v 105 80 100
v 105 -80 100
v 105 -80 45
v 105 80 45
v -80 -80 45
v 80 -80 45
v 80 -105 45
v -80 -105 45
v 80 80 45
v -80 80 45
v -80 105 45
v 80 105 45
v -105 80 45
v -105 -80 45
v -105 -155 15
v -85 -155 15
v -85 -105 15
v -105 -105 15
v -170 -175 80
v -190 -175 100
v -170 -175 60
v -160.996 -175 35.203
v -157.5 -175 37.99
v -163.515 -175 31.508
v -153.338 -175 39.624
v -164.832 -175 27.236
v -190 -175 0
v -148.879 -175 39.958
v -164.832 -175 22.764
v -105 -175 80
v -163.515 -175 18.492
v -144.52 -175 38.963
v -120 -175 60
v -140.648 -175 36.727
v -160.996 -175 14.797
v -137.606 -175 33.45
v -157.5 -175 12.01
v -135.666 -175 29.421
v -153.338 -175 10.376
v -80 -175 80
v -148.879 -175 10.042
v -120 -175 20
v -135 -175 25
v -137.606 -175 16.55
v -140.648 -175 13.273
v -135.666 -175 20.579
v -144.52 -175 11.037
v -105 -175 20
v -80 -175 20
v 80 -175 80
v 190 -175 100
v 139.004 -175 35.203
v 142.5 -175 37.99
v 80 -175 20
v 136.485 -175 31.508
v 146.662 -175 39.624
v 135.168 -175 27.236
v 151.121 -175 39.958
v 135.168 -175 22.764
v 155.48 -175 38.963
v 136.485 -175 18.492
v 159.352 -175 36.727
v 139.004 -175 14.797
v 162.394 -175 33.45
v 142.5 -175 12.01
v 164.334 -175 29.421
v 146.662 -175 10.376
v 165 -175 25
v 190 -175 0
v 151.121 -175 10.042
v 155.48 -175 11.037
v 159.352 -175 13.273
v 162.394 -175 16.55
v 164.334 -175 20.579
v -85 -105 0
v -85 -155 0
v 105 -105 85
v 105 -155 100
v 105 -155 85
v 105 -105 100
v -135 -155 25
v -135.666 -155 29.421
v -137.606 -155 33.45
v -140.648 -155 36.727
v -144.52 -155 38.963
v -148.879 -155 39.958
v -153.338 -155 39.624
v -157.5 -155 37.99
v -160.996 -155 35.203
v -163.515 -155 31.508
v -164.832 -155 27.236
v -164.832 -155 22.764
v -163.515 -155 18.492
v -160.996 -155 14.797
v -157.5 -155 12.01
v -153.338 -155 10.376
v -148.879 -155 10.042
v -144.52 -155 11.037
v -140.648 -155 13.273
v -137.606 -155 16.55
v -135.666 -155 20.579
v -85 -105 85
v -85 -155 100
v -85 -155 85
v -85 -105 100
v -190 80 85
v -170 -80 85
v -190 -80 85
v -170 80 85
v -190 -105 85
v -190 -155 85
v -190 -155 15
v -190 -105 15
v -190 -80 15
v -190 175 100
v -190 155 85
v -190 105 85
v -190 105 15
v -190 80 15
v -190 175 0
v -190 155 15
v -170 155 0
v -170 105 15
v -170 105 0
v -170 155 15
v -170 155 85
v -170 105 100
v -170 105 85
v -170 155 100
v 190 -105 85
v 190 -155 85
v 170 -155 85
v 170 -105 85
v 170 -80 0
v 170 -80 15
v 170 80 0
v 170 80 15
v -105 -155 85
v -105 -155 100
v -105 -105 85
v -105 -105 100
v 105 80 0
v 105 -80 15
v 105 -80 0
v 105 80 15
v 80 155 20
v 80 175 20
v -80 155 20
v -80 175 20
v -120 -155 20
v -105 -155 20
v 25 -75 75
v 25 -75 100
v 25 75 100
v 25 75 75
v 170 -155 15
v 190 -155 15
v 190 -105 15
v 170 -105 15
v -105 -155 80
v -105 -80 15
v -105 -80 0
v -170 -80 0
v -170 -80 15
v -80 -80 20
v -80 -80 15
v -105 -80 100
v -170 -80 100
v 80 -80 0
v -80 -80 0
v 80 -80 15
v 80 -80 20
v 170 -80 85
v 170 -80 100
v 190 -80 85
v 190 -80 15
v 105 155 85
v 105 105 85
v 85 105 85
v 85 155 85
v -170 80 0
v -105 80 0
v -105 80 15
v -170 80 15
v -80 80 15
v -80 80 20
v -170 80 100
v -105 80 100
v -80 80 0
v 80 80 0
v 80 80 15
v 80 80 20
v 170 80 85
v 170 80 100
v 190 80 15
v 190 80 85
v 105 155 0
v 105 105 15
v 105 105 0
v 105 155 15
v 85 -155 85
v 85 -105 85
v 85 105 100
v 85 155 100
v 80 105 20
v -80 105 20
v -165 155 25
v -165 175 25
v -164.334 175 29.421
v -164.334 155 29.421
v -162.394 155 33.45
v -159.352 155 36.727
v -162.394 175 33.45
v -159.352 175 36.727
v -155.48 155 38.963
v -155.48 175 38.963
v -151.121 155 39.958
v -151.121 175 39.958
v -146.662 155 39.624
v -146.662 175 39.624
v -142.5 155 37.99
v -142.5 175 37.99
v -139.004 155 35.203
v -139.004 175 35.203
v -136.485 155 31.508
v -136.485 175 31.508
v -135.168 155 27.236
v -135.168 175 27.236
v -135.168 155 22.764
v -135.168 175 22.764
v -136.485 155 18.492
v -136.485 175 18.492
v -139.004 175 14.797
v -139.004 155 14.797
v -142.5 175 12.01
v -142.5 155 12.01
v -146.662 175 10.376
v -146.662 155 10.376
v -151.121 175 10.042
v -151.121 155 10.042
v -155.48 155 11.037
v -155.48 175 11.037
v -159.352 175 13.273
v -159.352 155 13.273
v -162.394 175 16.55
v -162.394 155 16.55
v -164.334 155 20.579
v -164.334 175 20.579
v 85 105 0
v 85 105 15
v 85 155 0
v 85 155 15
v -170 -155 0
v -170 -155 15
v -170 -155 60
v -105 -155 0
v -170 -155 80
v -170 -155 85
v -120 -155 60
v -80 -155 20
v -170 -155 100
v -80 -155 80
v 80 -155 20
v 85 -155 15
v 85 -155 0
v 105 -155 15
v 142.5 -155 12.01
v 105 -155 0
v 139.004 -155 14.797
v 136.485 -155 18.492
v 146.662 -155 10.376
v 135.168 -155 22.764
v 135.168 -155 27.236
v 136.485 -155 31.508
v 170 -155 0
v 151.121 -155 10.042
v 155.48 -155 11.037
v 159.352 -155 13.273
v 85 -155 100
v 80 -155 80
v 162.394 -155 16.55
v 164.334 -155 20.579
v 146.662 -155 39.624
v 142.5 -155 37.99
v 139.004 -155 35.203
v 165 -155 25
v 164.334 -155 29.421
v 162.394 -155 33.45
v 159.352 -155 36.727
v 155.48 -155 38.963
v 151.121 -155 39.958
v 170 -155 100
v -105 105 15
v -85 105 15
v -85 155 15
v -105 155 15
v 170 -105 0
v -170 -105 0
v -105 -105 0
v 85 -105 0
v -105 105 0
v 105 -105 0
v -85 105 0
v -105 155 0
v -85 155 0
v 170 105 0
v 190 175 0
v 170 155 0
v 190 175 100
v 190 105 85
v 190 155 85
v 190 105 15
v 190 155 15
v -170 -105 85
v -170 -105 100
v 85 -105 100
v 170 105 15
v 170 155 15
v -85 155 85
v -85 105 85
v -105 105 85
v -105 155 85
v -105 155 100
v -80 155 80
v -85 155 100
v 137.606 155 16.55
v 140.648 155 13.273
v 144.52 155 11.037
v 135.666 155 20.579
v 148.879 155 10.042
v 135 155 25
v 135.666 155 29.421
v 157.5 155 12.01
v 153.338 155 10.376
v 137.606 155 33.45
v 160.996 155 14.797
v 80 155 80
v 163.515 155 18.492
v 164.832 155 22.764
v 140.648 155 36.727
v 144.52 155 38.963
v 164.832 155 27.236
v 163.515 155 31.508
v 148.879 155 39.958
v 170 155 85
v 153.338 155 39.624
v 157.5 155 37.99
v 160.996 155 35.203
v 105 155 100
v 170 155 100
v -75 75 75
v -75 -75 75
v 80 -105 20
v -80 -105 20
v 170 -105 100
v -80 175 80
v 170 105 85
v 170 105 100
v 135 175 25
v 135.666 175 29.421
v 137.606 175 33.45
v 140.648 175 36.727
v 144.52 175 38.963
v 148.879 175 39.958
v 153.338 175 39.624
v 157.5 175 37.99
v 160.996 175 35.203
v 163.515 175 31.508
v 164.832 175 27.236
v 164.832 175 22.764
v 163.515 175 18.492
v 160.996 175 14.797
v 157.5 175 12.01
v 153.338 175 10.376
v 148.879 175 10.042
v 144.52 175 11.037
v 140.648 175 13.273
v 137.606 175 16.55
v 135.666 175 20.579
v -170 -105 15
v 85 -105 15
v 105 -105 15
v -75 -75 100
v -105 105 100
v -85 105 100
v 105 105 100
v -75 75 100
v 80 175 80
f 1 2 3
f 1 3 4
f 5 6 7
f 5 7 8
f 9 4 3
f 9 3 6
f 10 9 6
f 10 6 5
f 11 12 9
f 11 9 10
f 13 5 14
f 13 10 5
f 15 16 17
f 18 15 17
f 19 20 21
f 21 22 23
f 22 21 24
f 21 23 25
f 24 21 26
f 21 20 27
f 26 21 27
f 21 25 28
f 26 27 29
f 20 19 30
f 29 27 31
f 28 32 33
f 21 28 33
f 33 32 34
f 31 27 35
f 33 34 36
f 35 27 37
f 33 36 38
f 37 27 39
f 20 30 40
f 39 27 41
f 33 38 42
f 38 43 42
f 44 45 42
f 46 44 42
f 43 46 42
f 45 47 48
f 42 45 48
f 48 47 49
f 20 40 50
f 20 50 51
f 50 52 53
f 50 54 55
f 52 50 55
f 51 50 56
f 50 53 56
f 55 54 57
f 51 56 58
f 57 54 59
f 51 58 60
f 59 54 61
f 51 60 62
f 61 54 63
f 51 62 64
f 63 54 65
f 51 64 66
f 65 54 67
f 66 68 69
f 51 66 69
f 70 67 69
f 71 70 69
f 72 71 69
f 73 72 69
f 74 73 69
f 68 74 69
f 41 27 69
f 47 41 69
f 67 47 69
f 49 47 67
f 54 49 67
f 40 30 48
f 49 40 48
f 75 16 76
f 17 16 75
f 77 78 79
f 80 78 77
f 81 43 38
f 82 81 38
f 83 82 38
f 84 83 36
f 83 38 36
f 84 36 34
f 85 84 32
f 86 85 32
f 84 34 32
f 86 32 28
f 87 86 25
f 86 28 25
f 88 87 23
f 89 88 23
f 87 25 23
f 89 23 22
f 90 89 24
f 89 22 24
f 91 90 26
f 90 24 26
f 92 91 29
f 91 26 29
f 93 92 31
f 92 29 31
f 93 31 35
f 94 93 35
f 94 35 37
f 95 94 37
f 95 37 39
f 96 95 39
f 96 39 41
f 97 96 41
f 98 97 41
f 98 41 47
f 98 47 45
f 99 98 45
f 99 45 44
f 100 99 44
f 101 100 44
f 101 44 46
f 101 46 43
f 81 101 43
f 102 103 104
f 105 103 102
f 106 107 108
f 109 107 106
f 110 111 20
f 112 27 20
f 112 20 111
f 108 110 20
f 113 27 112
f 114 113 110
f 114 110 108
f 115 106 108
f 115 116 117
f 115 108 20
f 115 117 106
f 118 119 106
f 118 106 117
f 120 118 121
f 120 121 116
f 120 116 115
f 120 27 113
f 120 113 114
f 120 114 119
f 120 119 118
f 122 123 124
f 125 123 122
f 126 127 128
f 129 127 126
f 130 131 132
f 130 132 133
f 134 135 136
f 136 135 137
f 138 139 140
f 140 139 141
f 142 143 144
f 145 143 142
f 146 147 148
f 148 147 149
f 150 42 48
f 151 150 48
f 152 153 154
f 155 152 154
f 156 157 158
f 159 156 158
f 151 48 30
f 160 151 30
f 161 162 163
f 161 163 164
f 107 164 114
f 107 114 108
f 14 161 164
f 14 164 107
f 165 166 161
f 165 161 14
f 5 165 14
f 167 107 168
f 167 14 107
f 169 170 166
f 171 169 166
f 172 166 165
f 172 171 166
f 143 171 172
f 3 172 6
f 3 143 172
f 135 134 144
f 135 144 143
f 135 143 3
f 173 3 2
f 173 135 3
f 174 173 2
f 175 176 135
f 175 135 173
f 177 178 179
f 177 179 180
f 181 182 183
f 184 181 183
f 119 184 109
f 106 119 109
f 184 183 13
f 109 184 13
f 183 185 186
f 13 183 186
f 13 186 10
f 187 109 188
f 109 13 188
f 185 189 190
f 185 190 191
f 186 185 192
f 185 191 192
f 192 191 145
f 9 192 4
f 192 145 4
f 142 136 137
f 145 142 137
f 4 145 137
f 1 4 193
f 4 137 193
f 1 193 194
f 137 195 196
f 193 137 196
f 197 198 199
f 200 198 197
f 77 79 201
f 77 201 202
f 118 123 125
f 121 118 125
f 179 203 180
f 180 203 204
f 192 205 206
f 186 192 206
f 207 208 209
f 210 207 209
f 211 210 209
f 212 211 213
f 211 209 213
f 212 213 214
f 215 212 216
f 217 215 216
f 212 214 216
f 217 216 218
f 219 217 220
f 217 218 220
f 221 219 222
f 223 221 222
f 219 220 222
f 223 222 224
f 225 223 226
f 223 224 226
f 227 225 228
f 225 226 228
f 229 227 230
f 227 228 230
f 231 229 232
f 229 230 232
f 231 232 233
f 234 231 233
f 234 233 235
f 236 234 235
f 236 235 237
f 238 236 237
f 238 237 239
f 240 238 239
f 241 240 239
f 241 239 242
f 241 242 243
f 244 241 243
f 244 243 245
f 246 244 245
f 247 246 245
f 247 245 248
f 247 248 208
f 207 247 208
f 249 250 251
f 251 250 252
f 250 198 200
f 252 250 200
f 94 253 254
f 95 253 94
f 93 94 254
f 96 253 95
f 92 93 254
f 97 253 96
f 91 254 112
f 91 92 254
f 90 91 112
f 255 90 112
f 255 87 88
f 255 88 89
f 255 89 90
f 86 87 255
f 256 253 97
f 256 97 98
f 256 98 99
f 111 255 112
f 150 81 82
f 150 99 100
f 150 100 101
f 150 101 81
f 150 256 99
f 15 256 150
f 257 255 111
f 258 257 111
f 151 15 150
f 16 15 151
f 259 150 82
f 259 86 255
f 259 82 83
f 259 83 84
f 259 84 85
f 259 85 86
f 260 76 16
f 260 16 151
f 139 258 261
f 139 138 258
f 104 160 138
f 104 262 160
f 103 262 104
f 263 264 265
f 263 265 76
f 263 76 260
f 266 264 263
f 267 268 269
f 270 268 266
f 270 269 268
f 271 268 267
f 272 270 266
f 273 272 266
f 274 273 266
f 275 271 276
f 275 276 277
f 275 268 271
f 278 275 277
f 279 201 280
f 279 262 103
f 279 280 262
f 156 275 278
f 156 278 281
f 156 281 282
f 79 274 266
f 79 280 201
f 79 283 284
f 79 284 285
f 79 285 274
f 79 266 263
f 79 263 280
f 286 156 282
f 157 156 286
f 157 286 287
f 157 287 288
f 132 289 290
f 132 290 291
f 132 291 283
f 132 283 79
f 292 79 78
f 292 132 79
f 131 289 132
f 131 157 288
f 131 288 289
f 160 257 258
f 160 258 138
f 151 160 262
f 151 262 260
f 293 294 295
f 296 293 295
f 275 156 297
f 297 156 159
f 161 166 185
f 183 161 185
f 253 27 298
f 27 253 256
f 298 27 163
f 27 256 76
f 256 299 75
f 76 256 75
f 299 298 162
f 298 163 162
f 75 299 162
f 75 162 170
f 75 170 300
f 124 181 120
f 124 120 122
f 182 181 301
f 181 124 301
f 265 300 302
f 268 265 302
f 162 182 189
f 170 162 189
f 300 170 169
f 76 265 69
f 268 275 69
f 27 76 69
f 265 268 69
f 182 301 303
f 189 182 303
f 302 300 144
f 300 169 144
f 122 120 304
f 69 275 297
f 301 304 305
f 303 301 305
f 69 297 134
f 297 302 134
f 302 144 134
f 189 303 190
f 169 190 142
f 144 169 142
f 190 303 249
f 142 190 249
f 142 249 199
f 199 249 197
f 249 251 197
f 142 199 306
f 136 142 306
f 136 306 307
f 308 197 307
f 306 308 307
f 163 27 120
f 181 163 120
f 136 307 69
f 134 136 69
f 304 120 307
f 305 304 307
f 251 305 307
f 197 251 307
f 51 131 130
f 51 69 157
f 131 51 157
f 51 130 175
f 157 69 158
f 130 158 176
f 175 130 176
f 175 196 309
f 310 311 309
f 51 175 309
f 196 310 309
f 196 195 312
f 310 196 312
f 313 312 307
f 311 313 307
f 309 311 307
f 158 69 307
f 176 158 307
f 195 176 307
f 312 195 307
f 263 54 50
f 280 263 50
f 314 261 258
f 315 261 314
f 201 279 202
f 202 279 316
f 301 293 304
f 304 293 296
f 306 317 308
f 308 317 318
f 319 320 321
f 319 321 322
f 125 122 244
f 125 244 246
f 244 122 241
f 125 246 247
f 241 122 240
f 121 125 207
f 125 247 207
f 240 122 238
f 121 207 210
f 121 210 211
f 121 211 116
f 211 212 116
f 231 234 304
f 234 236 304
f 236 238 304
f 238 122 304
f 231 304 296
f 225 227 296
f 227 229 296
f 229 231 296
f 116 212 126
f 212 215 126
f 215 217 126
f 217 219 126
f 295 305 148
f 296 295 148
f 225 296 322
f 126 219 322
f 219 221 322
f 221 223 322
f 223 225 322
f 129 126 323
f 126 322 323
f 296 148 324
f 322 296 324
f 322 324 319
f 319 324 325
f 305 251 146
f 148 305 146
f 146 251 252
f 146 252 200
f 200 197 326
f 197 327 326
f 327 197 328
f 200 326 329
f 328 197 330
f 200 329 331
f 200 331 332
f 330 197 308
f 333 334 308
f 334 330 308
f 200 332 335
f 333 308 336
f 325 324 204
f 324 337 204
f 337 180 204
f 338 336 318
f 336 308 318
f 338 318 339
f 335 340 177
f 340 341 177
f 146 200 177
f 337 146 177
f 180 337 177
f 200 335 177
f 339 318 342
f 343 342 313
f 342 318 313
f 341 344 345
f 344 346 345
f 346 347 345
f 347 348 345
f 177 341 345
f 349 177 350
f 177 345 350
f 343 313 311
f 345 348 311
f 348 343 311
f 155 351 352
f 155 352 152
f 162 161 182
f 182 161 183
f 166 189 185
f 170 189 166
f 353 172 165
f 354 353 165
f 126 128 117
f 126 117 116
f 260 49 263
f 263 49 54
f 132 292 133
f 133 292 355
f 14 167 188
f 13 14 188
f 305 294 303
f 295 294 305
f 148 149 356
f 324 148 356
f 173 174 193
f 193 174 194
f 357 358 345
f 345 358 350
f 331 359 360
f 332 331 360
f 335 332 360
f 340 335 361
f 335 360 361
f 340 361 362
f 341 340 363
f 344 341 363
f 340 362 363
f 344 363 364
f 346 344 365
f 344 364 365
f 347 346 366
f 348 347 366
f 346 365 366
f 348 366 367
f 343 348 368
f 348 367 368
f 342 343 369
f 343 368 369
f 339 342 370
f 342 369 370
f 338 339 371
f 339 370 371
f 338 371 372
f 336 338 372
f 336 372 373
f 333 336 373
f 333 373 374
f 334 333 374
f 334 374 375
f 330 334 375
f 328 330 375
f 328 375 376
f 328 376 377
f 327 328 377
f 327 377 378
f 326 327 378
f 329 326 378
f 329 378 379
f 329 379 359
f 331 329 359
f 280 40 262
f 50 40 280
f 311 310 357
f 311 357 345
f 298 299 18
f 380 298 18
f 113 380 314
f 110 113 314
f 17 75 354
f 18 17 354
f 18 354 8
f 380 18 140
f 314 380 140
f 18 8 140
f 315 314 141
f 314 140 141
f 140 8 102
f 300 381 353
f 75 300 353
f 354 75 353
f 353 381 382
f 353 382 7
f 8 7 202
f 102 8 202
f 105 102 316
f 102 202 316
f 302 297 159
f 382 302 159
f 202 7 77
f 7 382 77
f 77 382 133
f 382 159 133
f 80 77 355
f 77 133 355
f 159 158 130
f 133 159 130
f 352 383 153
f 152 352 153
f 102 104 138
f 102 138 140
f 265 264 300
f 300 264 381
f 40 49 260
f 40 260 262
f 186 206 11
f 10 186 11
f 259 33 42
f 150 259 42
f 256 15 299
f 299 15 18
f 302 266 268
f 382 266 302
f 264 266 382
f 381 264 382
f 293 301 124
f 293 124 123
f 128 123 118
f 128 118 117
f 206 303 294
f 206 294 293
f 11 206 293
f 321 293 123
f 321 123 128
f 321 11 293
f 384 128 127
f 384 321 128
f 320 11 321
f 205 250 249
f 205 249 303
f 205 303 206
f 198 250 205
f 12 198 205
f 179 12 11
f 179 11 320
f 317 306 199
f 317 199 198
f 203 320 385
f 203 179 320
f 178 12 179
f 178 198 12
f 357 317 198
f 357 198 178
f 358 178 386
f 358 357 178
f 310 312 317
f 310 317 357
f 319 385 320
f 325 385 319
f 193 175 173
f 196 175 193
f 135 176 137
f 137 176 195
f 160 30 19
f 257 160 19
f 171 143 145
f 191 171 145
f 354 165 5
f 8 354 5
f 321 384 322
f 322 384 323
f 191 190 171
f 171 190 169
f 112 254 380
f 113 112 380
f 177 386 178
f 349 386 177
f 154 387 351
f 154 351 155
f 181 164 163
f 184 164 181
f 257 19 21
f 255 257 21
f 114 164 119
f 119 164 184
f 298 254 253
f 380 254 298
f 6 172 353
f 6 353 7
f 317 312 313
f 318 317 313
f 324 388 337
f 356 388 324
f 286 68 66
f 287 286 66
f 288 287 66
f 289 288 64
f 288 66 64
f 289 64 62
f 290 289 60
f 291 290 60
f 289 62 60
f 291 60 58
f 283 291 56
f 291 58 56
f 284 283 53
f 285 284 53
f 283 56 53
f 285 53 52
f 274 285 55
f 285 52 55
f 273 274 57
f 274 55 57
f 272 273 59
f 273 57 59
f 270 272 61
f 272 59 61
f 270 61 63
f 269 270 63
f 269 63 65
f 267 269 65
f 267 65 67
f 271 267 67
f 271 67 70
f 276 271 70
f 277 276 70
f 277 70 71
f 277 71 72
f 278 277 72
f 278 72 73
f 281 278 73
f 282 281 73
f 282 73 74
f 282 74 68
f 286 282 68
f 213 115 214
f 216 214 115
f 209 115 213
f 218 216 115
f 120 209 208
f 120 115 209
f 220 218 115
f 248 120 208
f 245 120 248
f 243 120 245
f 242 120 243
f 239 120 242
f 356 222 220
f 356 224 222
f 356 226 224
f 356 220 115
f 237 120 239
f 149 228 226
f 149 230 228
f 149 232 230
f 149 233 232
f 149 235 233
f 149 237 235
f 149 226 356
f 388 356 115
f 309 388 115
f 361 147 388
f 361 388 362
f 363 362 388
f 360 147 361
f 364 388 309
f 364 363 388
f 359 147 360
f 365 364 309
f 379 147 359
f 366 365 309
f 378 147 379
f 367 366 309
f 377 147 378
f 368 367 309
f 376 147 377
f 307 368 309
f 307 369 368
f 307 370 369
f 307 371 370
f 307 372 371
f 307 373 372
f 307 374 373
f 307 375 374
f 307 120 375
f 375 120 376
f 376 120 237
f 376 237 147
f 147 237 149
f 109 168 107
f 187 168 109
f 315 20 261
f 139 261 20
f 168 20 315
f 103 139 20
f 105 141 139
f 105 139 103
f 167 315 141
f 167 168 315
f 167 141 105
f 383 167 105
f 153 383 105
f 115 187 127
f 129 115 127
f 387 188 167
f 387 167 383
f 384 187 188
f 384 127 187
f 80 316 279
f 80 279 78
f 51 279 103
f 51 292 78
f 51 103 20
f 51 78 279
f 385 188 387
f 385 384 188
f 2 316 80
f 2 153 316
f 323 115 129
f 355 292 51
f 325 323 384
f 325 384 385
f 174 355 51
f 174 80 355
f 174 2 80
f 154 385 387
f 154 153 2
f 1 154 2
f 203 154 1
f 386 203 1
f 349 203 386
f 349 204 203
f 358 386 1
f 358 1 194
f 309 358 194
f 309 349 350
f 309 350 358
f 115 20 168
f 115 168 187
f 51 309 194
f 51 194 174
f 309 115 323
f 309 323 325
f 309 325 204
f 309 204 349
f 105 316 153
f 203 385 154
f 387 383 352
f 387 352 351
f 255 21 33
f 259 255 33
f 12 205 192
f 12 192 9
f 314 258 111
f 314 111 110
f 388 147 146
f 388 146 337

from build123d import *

# Parameters (mm, degrees)
F0_W      = 380
F0_H      = 350
F1_DEPTH  = 100
F2_W      = 170
F2_H      = 50
F2_W_2    = 65
F2_H_2    = 160
F3_DEPTH  = 100.001
F4_W      = 50
F4_H      = 70
F4_W_2    = 160
F5_DEPTH  = 380.001
F7_R      = 15
F8_DEPTH  = 25
F9_R      = 15
F10_DEPTH = 25
F11_W     = 160
F11_H     = 60
F12_DEPTH = 25
F13_W     = 160
F13_H     = 60
F14_DEPTH = 25
F15_W     = 160
F15_H     = 160
F16_DEPTH = 25
F17_W     = 210
F17_H     = 210
F18_DEPTH = 40
F19_W     = 100
F19_H     = 150
F20_DEPTH = 25
F21_W     = 160
F21_H     = 25
F22_DEPTH = 350.001
F24_DEPTH = 25


with BuildPart() as f1:
    # F0 (on Top) → F1 (new body)
    with BuildSketch(Plane.XY):
        Rectangle(F0_W, F0_H)
    extrude(amount=F1_DEPTH)

    # F2 (on face) → F3 (cut, through all)
    with BuildSketch(Plane.XY.offset(100)):
        with Locations((0, 130)):
            Rectangle(F2_W, F2_H)
        with Locations((137.5, 130)):
            Rectangle(F2_W_2, F2_H)
        with Locations((137.5, 0)):
            Rectangle(F2_W_2, F2_H_2)
        with Locations((137.5, -130)):
            Rectangle(F2_W_2, F2_H)
        with Locations((0, -130)):
            Rectangle(F2_W, F2_H)
        with Locations((-137.5, -130)):
            Rectangle(F2_W_2, F2_H)
        with Locations((-137.5, 0)):
            Rectangle(F2_W_2, F2_H_2)
        with Locations((-137.5, 130)):
            Rectangle(F2_W_2, F2_H)
    extrude(amount=-F3_DEPTH, mode=Mode.SUBTRACT)

    # F4 (on face) → F5 (cut, through all)
    with BuildSketch(Plane.YZ.offset(190)):
        with Locations((-130, 50)):
            Rectangle(F4_W, F4_H)
        with Locations((0, 50)):
            Rectangle(F4_W_2, F4_H)
        with Locations((130, 50)):
            Rectangle(F4_W, F4_H)
    extrude(amount=-F5_DEPTH, mode=Mode.SUBTRACT)

    # F7 (on face) → F8 (cut)
    with BuildSketch(Plane.XZ.offset(175)):
        with Locations((-150, 25)):
            Circle(F7_R)
        with Locations((150, 25)):
            Circle(F7_R)
    extrude(amount=-F8_DEPTH, mode=Mode.SUBTRACT)

    # F9 (on face) → F10 (cut)
    with BuildSketch(Plane(origin=(0, 175, 0), x_dir=(-1, 0, 0), z_dir=(0, 1, 0))):
        with Locations((-150, 25)):
            Circle(F9_R)
        with Locations((150, 25)):
            Circle(F9_R)
    extrude(amount=-F10_DEPTH, mode=Mode.SUBTRACT)

    # F11 (on face) → F12 (cut)
    with BuildSketch(Plane(origin=(0, 175, 0), x_dir=(-1, 0, 0), z_dir=(0, 1, 0))):
        with Locations((0, 50)):
            Rectangle(F11_W, F11_H)
    extrude(amount=-F12_DEPTH, mode=Mode.SUBTRACT)

    # F13 (on face) → F14 (cut)
    with BuildSketch(Plane.XZ.offset(175)):
        with Locations((0, 50)):
            Rectangle(F13_W, F13_H)
    extrude(amount=-F14_DEPTH, mode=Mode.SUBTRACT)

    # F15 (on face) → F16 (cut)
    with BuildSketch(Plane(origin=(0, 0, 0), x_dir=(1, 0, 0), z_dir=(0, 0, -1))):
        Rectangle(F15_W, F15_H)
    extrude(amount=-F16_DEPTH, mode=Mode.SUBTRACT)

    # F17 (on face) → F18 (join)
    with BuildSketch(Plane(origin=(0, 0, 85), x_dir=(1, 0, 0), z_dir=(0, 0, -1))):
        Rectangle(F17_W, F17_H)
    extrude(amount=F18_DEPTH)

    # F19 (on face) → F20 (cut)
    with BuildSketch(Plane.XY.offset(100)):
        with Locations((-25, 0)):
            Rectangle(F19_W, F19_H)
    extrude(amount=-F20_DEPTH, mode=Mode.SUBTRACT)

    # F21 (on face) → F22 (cut, through all)
    with BuildSketch(Plane(origin=(0, 175, 0), x_dir=(-1, 0, 0), z_dir=(0, 1, 0))):
        with Locations((0, 32.5)):
            Rectangle(F21_W, F21_H)
    extrude(amount=-F22_DEPTH, mode=Mode.SUBTRACT)

    # F23 (on face) → F24 (cut)
    with BuildSketch(Plane.XZ.offset(175)):
        Polygon((-105, 80), (-170, 80), (-170, 60), (-120, 60), (-120, 20), (-105, 20), align=None)
    extrude(amount=-F24_DEPTH, mode=Mode.SUBTRACT)


solid = f1.part
